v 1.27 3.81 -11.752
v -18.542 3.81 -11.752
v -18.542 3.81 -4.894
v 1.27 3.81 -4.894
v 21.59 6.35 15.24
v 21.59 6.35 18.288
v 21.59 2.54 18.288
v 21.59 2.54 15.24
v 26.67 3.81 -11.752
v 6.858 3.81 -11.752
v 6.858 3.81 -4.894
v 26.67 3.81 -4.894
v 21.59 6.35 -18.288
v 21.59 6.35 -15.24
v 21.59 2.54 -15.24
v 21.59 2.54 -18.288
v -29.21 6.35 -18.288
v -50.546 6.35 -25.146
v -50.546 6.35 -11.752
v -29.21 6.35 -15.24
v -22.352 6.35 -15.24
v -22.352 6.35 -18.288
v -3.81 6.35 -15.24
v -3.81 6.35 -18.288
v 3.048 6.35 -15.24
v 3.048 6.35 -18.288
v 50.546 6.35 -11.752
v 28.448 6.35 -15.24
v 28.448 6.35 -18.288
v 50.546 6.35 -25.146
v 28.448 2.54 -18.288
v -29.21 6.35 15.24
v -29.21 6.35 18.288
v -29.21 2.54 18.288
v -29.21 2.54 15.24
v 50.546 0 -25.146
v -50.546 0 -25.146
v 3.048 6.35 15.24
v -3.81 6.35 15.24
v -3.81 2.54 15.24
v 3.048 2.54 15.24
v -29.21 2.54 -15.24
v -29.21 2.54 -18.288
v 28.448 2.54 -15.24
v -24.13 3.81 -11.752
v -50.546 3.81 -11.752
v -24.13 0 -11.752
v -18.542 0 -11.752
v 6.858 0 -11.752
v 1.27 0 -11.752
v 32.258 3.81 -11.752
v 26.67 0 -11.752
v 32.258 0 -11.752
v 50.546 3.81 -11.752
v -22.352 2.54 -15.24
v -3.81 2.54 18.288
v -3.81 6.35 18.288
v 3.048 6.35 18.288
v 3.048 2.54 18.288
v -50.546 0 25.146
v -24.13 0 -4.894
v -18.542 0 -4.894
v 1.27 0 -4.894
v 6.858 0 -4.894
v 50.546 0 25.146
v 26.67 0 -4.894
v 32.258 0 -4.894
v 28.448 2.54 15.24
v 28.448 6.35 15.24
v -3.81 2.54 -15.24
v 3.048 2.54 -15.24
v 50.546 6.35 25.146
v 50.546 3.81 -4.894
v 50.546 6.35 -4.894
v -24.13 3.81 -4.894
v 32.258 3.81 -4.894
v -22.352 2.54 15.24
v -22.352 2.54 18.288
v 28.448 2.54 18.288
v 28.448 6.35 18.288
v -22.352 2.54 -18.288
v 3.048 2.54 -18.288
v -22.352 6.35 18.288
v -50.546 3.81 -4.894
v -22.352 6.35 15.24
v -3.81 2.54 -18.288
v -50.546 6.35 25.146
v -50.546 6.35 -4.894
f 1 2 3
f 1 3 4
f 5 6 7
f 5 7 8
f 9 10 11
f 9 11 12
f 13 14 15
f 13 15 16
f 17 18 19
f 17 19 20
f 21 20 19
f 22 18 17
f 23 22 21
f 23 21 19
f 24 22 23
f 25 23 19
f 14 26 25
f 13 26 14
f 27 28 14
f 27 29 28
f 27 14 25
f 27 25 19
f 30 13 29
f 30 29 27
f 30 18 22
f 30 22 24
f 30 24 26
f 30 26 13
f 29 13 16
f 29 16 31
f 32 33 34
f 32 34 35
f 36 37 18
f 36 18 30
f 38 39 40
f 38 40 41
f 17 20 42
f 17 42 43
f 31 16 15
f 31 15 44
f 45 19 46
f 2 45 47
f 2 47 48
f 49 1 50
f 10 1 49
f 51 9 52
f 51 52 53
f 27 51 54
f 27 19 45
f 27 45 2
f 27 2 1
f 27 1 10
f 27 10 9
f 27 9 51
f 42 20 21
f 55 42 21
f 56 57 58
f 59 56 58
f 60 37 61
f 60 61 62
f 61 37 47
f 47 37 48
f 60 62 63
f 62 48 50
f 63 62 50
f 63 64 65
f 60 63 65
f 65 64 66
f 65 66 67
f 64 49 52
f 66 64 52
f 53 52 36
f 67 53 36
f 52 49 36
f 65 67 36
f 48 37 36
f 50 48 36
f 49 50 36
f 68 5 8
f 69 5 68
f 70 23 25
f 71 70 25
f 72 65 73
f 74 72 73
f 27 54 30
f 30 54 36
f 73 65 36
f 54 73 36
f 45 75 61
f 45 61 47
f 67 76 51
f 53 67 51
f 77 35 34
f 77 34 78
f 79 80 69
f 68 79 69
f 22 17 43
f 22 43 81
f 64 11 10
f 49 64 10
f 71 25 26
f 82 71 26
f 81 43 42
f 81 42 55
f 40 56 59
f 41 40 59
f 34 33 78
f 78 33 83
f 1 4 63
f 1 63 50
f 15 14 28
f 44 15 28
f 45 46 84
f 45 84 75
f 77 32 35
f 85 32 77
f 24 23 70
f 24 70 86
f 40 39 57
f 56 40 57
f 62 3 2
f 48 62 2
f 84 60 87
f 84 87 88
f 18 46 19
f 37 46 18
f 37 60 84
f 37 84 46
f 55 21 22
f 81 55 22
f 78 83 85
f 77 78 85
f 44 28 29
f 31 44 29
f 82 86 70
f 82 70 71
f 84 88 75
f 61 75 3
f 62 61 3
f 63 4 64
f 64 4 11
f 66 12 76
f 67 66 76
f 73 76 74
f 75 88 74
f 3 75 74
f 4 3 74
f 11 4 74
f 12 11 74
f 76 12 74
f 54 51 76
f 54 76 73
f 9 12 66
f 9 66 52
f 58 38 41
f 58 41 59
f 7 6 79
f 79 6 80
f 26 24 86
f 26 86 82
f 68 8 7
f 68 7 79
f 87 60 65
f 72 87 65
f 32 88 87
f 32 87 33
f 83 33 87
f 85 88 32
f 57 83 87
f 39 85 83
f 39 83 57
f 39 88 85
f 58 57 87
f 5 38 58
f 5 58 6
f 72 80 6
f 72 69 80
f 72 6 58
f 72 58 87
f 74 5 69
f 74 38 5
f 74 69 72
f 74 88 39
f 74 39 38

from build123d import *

# Parameters (mm, degrees)
SKETCH1_W                     = 101.092
SKETCH1_H                     = 50.292
BOSS_EXTRUDE1_DEPTH           = 6.35
SKETCH2_W                     = 5.588
SKETCH2_H                     = 6.858
WIRE_HOLE_DEPTH               = 7.35
SKETCH3_W                     = 6.858
SKETCH3_H                     = 3.048
CUT_EXTRUDE2_DEPTH            = 3.81
LPATTERN1_COUNT               = 2
LPATTERN1_PITCH               = 25.4
LPATTERN1_COPY_1_SKETCH_W     = 6.858
LPATTERN1_COPY_1_SKETCH_H     = 3.048
LPATTERN1_COPY_1_DEPTH        = 3.81
LPATTERN1_COL_COUNT           = 2
LPATTERN1_COL_PITCH           = 25.4
LPATTERN1_COL_COPY_1_SKETCH_W = 6.858
LPATTERN1_COL_COPY_1_SKETCH_H = 3.048
LPATTERN1_COL_COPY_1_DEPTH    = 3.81
SKETCH4_W                     = 101.092
SKETCH4_H                     = 6.858
CUT_EXTRUDE3_DEPTH            = 2.54


with BuildPart() as part:
    # Sketch1 → Boss-Extrude1 (new body)
    with BuildSketch(Plane(origin=(0, 0, 0), x_dir=(1, 0, 0), z_dir=(0, 1, 0))):
        Rectangle(SKETCH1_W, SKETCH1_H)
    extrude(amount=BOSS_EXTRUDE1_DEPTH)

    # Sketch2 → Wire Hole (cut, through all)
    with BuildSketch(Plane(origin=(0, 6.35, 0), x_dir=(1, 0, 0), z_dir=(0, 1, 0))):
        with Locations((4.064, 8.322545685)):
            Rectangle(SKETCH2_W, SKETCH2_H)
    wire_hole = extrude(amount=-WIRE_HOLE_DEPTH, mode=Mode.SUBTRACT)

    # Sketch3 → Cut-Extrude2 (cut)
    with BuildSketch(Plane(origin=(0, 6.35, 0), x_dir=(1, 0, 0), z_dir=(0, 1, 0))):
        with Locations((-0.381, 16.764)):
            Rectangle(SKETCH3_W, SKETCH3_H)
    cut_extrude2 = extrude(amount=-CUT_EXTRUDE2_DEPTH, mode=Mode.SUBTRACT)

    # Mirror1: Cut-Extrude2 across plane
    add(cut_extrude2.mirror(Plane.XY), mode=Mode.SUBTRACT)

    # LPattern1: Wire Hole, Cut-Extrude2 ×2
    with Locations(*[(-i * LPATTERN1_PITCH, 0, 0) for i in range(1, LPATTERN1_COUNT)]):
        add(wire_hole, mode=Mode.SUBTRACT)
        add(cut_extrude2, mode=Mode.SUBTRACT)

    # LPattern1 copy 1 sketch → LPattern1 copy 1 (cut)
    with BuildSketch(Plane(origin=(-25.4, 6.35, 0), x_dir=(1, 0, 0), z_dir=(0, 1, 0))):
        with Locations((-0.381, -16.764)):
            Rectangle(LPATTERN1_COPY_1_SKETCH_W, LPATTERN1_COPY_1_SKETCH_H)
    extrude(amount=-LPATTERN1_COPY_1_DEPTH, mode=Mode.SUBTRACT)

    # LPattern1 col: Wire Hole, Cut-Extrude2 ×2
    with Locations(*[(i * LPATTERN1_COL_PITCH, 0, 0) for i in range(1, LPATTERN1_COL_COUNT)]):
        add(wire_hole, mode=Mode.SUBTRACT)
        add(cut_extrude2, mode=Mode.SUBTRACT)

    # LPattern1 col copy 1 sketch → LPattern1 col copy 1 (cut)
    with BuildSketch(Plane(origin=(25.4, 6.35, 0), x_dir=(1, 0, 0), z_dir=(0, 1, 0))):
        with Locations((-0.381, -16.764)):
            Rectangle(LPATTERN1_COL_COPY_1_SKETCH_W, LPATTERN1_COL_COPY_1_SKETCH_H)
    extrude(amount=-LPATTERN1_COL_COPY_1_DEPTH, mode=Mode.SUBTRACT)

    # Sketch4 → Cut-Extrude3 (cut)
    with BuildSketch(Plane(origin=(0, 6.35, 0), x_dir=(1, 0, 0), z_dir=(0, 1, 0))):
        with Locations((0, 8.322545685)):
            Rectangle(SKETCH4_W, SKETCH4_H)
    extrude(amount=-CUT_EXTRUDE3_DEPTH, mode=Mode.SUBTRACT)


solid = part.part
